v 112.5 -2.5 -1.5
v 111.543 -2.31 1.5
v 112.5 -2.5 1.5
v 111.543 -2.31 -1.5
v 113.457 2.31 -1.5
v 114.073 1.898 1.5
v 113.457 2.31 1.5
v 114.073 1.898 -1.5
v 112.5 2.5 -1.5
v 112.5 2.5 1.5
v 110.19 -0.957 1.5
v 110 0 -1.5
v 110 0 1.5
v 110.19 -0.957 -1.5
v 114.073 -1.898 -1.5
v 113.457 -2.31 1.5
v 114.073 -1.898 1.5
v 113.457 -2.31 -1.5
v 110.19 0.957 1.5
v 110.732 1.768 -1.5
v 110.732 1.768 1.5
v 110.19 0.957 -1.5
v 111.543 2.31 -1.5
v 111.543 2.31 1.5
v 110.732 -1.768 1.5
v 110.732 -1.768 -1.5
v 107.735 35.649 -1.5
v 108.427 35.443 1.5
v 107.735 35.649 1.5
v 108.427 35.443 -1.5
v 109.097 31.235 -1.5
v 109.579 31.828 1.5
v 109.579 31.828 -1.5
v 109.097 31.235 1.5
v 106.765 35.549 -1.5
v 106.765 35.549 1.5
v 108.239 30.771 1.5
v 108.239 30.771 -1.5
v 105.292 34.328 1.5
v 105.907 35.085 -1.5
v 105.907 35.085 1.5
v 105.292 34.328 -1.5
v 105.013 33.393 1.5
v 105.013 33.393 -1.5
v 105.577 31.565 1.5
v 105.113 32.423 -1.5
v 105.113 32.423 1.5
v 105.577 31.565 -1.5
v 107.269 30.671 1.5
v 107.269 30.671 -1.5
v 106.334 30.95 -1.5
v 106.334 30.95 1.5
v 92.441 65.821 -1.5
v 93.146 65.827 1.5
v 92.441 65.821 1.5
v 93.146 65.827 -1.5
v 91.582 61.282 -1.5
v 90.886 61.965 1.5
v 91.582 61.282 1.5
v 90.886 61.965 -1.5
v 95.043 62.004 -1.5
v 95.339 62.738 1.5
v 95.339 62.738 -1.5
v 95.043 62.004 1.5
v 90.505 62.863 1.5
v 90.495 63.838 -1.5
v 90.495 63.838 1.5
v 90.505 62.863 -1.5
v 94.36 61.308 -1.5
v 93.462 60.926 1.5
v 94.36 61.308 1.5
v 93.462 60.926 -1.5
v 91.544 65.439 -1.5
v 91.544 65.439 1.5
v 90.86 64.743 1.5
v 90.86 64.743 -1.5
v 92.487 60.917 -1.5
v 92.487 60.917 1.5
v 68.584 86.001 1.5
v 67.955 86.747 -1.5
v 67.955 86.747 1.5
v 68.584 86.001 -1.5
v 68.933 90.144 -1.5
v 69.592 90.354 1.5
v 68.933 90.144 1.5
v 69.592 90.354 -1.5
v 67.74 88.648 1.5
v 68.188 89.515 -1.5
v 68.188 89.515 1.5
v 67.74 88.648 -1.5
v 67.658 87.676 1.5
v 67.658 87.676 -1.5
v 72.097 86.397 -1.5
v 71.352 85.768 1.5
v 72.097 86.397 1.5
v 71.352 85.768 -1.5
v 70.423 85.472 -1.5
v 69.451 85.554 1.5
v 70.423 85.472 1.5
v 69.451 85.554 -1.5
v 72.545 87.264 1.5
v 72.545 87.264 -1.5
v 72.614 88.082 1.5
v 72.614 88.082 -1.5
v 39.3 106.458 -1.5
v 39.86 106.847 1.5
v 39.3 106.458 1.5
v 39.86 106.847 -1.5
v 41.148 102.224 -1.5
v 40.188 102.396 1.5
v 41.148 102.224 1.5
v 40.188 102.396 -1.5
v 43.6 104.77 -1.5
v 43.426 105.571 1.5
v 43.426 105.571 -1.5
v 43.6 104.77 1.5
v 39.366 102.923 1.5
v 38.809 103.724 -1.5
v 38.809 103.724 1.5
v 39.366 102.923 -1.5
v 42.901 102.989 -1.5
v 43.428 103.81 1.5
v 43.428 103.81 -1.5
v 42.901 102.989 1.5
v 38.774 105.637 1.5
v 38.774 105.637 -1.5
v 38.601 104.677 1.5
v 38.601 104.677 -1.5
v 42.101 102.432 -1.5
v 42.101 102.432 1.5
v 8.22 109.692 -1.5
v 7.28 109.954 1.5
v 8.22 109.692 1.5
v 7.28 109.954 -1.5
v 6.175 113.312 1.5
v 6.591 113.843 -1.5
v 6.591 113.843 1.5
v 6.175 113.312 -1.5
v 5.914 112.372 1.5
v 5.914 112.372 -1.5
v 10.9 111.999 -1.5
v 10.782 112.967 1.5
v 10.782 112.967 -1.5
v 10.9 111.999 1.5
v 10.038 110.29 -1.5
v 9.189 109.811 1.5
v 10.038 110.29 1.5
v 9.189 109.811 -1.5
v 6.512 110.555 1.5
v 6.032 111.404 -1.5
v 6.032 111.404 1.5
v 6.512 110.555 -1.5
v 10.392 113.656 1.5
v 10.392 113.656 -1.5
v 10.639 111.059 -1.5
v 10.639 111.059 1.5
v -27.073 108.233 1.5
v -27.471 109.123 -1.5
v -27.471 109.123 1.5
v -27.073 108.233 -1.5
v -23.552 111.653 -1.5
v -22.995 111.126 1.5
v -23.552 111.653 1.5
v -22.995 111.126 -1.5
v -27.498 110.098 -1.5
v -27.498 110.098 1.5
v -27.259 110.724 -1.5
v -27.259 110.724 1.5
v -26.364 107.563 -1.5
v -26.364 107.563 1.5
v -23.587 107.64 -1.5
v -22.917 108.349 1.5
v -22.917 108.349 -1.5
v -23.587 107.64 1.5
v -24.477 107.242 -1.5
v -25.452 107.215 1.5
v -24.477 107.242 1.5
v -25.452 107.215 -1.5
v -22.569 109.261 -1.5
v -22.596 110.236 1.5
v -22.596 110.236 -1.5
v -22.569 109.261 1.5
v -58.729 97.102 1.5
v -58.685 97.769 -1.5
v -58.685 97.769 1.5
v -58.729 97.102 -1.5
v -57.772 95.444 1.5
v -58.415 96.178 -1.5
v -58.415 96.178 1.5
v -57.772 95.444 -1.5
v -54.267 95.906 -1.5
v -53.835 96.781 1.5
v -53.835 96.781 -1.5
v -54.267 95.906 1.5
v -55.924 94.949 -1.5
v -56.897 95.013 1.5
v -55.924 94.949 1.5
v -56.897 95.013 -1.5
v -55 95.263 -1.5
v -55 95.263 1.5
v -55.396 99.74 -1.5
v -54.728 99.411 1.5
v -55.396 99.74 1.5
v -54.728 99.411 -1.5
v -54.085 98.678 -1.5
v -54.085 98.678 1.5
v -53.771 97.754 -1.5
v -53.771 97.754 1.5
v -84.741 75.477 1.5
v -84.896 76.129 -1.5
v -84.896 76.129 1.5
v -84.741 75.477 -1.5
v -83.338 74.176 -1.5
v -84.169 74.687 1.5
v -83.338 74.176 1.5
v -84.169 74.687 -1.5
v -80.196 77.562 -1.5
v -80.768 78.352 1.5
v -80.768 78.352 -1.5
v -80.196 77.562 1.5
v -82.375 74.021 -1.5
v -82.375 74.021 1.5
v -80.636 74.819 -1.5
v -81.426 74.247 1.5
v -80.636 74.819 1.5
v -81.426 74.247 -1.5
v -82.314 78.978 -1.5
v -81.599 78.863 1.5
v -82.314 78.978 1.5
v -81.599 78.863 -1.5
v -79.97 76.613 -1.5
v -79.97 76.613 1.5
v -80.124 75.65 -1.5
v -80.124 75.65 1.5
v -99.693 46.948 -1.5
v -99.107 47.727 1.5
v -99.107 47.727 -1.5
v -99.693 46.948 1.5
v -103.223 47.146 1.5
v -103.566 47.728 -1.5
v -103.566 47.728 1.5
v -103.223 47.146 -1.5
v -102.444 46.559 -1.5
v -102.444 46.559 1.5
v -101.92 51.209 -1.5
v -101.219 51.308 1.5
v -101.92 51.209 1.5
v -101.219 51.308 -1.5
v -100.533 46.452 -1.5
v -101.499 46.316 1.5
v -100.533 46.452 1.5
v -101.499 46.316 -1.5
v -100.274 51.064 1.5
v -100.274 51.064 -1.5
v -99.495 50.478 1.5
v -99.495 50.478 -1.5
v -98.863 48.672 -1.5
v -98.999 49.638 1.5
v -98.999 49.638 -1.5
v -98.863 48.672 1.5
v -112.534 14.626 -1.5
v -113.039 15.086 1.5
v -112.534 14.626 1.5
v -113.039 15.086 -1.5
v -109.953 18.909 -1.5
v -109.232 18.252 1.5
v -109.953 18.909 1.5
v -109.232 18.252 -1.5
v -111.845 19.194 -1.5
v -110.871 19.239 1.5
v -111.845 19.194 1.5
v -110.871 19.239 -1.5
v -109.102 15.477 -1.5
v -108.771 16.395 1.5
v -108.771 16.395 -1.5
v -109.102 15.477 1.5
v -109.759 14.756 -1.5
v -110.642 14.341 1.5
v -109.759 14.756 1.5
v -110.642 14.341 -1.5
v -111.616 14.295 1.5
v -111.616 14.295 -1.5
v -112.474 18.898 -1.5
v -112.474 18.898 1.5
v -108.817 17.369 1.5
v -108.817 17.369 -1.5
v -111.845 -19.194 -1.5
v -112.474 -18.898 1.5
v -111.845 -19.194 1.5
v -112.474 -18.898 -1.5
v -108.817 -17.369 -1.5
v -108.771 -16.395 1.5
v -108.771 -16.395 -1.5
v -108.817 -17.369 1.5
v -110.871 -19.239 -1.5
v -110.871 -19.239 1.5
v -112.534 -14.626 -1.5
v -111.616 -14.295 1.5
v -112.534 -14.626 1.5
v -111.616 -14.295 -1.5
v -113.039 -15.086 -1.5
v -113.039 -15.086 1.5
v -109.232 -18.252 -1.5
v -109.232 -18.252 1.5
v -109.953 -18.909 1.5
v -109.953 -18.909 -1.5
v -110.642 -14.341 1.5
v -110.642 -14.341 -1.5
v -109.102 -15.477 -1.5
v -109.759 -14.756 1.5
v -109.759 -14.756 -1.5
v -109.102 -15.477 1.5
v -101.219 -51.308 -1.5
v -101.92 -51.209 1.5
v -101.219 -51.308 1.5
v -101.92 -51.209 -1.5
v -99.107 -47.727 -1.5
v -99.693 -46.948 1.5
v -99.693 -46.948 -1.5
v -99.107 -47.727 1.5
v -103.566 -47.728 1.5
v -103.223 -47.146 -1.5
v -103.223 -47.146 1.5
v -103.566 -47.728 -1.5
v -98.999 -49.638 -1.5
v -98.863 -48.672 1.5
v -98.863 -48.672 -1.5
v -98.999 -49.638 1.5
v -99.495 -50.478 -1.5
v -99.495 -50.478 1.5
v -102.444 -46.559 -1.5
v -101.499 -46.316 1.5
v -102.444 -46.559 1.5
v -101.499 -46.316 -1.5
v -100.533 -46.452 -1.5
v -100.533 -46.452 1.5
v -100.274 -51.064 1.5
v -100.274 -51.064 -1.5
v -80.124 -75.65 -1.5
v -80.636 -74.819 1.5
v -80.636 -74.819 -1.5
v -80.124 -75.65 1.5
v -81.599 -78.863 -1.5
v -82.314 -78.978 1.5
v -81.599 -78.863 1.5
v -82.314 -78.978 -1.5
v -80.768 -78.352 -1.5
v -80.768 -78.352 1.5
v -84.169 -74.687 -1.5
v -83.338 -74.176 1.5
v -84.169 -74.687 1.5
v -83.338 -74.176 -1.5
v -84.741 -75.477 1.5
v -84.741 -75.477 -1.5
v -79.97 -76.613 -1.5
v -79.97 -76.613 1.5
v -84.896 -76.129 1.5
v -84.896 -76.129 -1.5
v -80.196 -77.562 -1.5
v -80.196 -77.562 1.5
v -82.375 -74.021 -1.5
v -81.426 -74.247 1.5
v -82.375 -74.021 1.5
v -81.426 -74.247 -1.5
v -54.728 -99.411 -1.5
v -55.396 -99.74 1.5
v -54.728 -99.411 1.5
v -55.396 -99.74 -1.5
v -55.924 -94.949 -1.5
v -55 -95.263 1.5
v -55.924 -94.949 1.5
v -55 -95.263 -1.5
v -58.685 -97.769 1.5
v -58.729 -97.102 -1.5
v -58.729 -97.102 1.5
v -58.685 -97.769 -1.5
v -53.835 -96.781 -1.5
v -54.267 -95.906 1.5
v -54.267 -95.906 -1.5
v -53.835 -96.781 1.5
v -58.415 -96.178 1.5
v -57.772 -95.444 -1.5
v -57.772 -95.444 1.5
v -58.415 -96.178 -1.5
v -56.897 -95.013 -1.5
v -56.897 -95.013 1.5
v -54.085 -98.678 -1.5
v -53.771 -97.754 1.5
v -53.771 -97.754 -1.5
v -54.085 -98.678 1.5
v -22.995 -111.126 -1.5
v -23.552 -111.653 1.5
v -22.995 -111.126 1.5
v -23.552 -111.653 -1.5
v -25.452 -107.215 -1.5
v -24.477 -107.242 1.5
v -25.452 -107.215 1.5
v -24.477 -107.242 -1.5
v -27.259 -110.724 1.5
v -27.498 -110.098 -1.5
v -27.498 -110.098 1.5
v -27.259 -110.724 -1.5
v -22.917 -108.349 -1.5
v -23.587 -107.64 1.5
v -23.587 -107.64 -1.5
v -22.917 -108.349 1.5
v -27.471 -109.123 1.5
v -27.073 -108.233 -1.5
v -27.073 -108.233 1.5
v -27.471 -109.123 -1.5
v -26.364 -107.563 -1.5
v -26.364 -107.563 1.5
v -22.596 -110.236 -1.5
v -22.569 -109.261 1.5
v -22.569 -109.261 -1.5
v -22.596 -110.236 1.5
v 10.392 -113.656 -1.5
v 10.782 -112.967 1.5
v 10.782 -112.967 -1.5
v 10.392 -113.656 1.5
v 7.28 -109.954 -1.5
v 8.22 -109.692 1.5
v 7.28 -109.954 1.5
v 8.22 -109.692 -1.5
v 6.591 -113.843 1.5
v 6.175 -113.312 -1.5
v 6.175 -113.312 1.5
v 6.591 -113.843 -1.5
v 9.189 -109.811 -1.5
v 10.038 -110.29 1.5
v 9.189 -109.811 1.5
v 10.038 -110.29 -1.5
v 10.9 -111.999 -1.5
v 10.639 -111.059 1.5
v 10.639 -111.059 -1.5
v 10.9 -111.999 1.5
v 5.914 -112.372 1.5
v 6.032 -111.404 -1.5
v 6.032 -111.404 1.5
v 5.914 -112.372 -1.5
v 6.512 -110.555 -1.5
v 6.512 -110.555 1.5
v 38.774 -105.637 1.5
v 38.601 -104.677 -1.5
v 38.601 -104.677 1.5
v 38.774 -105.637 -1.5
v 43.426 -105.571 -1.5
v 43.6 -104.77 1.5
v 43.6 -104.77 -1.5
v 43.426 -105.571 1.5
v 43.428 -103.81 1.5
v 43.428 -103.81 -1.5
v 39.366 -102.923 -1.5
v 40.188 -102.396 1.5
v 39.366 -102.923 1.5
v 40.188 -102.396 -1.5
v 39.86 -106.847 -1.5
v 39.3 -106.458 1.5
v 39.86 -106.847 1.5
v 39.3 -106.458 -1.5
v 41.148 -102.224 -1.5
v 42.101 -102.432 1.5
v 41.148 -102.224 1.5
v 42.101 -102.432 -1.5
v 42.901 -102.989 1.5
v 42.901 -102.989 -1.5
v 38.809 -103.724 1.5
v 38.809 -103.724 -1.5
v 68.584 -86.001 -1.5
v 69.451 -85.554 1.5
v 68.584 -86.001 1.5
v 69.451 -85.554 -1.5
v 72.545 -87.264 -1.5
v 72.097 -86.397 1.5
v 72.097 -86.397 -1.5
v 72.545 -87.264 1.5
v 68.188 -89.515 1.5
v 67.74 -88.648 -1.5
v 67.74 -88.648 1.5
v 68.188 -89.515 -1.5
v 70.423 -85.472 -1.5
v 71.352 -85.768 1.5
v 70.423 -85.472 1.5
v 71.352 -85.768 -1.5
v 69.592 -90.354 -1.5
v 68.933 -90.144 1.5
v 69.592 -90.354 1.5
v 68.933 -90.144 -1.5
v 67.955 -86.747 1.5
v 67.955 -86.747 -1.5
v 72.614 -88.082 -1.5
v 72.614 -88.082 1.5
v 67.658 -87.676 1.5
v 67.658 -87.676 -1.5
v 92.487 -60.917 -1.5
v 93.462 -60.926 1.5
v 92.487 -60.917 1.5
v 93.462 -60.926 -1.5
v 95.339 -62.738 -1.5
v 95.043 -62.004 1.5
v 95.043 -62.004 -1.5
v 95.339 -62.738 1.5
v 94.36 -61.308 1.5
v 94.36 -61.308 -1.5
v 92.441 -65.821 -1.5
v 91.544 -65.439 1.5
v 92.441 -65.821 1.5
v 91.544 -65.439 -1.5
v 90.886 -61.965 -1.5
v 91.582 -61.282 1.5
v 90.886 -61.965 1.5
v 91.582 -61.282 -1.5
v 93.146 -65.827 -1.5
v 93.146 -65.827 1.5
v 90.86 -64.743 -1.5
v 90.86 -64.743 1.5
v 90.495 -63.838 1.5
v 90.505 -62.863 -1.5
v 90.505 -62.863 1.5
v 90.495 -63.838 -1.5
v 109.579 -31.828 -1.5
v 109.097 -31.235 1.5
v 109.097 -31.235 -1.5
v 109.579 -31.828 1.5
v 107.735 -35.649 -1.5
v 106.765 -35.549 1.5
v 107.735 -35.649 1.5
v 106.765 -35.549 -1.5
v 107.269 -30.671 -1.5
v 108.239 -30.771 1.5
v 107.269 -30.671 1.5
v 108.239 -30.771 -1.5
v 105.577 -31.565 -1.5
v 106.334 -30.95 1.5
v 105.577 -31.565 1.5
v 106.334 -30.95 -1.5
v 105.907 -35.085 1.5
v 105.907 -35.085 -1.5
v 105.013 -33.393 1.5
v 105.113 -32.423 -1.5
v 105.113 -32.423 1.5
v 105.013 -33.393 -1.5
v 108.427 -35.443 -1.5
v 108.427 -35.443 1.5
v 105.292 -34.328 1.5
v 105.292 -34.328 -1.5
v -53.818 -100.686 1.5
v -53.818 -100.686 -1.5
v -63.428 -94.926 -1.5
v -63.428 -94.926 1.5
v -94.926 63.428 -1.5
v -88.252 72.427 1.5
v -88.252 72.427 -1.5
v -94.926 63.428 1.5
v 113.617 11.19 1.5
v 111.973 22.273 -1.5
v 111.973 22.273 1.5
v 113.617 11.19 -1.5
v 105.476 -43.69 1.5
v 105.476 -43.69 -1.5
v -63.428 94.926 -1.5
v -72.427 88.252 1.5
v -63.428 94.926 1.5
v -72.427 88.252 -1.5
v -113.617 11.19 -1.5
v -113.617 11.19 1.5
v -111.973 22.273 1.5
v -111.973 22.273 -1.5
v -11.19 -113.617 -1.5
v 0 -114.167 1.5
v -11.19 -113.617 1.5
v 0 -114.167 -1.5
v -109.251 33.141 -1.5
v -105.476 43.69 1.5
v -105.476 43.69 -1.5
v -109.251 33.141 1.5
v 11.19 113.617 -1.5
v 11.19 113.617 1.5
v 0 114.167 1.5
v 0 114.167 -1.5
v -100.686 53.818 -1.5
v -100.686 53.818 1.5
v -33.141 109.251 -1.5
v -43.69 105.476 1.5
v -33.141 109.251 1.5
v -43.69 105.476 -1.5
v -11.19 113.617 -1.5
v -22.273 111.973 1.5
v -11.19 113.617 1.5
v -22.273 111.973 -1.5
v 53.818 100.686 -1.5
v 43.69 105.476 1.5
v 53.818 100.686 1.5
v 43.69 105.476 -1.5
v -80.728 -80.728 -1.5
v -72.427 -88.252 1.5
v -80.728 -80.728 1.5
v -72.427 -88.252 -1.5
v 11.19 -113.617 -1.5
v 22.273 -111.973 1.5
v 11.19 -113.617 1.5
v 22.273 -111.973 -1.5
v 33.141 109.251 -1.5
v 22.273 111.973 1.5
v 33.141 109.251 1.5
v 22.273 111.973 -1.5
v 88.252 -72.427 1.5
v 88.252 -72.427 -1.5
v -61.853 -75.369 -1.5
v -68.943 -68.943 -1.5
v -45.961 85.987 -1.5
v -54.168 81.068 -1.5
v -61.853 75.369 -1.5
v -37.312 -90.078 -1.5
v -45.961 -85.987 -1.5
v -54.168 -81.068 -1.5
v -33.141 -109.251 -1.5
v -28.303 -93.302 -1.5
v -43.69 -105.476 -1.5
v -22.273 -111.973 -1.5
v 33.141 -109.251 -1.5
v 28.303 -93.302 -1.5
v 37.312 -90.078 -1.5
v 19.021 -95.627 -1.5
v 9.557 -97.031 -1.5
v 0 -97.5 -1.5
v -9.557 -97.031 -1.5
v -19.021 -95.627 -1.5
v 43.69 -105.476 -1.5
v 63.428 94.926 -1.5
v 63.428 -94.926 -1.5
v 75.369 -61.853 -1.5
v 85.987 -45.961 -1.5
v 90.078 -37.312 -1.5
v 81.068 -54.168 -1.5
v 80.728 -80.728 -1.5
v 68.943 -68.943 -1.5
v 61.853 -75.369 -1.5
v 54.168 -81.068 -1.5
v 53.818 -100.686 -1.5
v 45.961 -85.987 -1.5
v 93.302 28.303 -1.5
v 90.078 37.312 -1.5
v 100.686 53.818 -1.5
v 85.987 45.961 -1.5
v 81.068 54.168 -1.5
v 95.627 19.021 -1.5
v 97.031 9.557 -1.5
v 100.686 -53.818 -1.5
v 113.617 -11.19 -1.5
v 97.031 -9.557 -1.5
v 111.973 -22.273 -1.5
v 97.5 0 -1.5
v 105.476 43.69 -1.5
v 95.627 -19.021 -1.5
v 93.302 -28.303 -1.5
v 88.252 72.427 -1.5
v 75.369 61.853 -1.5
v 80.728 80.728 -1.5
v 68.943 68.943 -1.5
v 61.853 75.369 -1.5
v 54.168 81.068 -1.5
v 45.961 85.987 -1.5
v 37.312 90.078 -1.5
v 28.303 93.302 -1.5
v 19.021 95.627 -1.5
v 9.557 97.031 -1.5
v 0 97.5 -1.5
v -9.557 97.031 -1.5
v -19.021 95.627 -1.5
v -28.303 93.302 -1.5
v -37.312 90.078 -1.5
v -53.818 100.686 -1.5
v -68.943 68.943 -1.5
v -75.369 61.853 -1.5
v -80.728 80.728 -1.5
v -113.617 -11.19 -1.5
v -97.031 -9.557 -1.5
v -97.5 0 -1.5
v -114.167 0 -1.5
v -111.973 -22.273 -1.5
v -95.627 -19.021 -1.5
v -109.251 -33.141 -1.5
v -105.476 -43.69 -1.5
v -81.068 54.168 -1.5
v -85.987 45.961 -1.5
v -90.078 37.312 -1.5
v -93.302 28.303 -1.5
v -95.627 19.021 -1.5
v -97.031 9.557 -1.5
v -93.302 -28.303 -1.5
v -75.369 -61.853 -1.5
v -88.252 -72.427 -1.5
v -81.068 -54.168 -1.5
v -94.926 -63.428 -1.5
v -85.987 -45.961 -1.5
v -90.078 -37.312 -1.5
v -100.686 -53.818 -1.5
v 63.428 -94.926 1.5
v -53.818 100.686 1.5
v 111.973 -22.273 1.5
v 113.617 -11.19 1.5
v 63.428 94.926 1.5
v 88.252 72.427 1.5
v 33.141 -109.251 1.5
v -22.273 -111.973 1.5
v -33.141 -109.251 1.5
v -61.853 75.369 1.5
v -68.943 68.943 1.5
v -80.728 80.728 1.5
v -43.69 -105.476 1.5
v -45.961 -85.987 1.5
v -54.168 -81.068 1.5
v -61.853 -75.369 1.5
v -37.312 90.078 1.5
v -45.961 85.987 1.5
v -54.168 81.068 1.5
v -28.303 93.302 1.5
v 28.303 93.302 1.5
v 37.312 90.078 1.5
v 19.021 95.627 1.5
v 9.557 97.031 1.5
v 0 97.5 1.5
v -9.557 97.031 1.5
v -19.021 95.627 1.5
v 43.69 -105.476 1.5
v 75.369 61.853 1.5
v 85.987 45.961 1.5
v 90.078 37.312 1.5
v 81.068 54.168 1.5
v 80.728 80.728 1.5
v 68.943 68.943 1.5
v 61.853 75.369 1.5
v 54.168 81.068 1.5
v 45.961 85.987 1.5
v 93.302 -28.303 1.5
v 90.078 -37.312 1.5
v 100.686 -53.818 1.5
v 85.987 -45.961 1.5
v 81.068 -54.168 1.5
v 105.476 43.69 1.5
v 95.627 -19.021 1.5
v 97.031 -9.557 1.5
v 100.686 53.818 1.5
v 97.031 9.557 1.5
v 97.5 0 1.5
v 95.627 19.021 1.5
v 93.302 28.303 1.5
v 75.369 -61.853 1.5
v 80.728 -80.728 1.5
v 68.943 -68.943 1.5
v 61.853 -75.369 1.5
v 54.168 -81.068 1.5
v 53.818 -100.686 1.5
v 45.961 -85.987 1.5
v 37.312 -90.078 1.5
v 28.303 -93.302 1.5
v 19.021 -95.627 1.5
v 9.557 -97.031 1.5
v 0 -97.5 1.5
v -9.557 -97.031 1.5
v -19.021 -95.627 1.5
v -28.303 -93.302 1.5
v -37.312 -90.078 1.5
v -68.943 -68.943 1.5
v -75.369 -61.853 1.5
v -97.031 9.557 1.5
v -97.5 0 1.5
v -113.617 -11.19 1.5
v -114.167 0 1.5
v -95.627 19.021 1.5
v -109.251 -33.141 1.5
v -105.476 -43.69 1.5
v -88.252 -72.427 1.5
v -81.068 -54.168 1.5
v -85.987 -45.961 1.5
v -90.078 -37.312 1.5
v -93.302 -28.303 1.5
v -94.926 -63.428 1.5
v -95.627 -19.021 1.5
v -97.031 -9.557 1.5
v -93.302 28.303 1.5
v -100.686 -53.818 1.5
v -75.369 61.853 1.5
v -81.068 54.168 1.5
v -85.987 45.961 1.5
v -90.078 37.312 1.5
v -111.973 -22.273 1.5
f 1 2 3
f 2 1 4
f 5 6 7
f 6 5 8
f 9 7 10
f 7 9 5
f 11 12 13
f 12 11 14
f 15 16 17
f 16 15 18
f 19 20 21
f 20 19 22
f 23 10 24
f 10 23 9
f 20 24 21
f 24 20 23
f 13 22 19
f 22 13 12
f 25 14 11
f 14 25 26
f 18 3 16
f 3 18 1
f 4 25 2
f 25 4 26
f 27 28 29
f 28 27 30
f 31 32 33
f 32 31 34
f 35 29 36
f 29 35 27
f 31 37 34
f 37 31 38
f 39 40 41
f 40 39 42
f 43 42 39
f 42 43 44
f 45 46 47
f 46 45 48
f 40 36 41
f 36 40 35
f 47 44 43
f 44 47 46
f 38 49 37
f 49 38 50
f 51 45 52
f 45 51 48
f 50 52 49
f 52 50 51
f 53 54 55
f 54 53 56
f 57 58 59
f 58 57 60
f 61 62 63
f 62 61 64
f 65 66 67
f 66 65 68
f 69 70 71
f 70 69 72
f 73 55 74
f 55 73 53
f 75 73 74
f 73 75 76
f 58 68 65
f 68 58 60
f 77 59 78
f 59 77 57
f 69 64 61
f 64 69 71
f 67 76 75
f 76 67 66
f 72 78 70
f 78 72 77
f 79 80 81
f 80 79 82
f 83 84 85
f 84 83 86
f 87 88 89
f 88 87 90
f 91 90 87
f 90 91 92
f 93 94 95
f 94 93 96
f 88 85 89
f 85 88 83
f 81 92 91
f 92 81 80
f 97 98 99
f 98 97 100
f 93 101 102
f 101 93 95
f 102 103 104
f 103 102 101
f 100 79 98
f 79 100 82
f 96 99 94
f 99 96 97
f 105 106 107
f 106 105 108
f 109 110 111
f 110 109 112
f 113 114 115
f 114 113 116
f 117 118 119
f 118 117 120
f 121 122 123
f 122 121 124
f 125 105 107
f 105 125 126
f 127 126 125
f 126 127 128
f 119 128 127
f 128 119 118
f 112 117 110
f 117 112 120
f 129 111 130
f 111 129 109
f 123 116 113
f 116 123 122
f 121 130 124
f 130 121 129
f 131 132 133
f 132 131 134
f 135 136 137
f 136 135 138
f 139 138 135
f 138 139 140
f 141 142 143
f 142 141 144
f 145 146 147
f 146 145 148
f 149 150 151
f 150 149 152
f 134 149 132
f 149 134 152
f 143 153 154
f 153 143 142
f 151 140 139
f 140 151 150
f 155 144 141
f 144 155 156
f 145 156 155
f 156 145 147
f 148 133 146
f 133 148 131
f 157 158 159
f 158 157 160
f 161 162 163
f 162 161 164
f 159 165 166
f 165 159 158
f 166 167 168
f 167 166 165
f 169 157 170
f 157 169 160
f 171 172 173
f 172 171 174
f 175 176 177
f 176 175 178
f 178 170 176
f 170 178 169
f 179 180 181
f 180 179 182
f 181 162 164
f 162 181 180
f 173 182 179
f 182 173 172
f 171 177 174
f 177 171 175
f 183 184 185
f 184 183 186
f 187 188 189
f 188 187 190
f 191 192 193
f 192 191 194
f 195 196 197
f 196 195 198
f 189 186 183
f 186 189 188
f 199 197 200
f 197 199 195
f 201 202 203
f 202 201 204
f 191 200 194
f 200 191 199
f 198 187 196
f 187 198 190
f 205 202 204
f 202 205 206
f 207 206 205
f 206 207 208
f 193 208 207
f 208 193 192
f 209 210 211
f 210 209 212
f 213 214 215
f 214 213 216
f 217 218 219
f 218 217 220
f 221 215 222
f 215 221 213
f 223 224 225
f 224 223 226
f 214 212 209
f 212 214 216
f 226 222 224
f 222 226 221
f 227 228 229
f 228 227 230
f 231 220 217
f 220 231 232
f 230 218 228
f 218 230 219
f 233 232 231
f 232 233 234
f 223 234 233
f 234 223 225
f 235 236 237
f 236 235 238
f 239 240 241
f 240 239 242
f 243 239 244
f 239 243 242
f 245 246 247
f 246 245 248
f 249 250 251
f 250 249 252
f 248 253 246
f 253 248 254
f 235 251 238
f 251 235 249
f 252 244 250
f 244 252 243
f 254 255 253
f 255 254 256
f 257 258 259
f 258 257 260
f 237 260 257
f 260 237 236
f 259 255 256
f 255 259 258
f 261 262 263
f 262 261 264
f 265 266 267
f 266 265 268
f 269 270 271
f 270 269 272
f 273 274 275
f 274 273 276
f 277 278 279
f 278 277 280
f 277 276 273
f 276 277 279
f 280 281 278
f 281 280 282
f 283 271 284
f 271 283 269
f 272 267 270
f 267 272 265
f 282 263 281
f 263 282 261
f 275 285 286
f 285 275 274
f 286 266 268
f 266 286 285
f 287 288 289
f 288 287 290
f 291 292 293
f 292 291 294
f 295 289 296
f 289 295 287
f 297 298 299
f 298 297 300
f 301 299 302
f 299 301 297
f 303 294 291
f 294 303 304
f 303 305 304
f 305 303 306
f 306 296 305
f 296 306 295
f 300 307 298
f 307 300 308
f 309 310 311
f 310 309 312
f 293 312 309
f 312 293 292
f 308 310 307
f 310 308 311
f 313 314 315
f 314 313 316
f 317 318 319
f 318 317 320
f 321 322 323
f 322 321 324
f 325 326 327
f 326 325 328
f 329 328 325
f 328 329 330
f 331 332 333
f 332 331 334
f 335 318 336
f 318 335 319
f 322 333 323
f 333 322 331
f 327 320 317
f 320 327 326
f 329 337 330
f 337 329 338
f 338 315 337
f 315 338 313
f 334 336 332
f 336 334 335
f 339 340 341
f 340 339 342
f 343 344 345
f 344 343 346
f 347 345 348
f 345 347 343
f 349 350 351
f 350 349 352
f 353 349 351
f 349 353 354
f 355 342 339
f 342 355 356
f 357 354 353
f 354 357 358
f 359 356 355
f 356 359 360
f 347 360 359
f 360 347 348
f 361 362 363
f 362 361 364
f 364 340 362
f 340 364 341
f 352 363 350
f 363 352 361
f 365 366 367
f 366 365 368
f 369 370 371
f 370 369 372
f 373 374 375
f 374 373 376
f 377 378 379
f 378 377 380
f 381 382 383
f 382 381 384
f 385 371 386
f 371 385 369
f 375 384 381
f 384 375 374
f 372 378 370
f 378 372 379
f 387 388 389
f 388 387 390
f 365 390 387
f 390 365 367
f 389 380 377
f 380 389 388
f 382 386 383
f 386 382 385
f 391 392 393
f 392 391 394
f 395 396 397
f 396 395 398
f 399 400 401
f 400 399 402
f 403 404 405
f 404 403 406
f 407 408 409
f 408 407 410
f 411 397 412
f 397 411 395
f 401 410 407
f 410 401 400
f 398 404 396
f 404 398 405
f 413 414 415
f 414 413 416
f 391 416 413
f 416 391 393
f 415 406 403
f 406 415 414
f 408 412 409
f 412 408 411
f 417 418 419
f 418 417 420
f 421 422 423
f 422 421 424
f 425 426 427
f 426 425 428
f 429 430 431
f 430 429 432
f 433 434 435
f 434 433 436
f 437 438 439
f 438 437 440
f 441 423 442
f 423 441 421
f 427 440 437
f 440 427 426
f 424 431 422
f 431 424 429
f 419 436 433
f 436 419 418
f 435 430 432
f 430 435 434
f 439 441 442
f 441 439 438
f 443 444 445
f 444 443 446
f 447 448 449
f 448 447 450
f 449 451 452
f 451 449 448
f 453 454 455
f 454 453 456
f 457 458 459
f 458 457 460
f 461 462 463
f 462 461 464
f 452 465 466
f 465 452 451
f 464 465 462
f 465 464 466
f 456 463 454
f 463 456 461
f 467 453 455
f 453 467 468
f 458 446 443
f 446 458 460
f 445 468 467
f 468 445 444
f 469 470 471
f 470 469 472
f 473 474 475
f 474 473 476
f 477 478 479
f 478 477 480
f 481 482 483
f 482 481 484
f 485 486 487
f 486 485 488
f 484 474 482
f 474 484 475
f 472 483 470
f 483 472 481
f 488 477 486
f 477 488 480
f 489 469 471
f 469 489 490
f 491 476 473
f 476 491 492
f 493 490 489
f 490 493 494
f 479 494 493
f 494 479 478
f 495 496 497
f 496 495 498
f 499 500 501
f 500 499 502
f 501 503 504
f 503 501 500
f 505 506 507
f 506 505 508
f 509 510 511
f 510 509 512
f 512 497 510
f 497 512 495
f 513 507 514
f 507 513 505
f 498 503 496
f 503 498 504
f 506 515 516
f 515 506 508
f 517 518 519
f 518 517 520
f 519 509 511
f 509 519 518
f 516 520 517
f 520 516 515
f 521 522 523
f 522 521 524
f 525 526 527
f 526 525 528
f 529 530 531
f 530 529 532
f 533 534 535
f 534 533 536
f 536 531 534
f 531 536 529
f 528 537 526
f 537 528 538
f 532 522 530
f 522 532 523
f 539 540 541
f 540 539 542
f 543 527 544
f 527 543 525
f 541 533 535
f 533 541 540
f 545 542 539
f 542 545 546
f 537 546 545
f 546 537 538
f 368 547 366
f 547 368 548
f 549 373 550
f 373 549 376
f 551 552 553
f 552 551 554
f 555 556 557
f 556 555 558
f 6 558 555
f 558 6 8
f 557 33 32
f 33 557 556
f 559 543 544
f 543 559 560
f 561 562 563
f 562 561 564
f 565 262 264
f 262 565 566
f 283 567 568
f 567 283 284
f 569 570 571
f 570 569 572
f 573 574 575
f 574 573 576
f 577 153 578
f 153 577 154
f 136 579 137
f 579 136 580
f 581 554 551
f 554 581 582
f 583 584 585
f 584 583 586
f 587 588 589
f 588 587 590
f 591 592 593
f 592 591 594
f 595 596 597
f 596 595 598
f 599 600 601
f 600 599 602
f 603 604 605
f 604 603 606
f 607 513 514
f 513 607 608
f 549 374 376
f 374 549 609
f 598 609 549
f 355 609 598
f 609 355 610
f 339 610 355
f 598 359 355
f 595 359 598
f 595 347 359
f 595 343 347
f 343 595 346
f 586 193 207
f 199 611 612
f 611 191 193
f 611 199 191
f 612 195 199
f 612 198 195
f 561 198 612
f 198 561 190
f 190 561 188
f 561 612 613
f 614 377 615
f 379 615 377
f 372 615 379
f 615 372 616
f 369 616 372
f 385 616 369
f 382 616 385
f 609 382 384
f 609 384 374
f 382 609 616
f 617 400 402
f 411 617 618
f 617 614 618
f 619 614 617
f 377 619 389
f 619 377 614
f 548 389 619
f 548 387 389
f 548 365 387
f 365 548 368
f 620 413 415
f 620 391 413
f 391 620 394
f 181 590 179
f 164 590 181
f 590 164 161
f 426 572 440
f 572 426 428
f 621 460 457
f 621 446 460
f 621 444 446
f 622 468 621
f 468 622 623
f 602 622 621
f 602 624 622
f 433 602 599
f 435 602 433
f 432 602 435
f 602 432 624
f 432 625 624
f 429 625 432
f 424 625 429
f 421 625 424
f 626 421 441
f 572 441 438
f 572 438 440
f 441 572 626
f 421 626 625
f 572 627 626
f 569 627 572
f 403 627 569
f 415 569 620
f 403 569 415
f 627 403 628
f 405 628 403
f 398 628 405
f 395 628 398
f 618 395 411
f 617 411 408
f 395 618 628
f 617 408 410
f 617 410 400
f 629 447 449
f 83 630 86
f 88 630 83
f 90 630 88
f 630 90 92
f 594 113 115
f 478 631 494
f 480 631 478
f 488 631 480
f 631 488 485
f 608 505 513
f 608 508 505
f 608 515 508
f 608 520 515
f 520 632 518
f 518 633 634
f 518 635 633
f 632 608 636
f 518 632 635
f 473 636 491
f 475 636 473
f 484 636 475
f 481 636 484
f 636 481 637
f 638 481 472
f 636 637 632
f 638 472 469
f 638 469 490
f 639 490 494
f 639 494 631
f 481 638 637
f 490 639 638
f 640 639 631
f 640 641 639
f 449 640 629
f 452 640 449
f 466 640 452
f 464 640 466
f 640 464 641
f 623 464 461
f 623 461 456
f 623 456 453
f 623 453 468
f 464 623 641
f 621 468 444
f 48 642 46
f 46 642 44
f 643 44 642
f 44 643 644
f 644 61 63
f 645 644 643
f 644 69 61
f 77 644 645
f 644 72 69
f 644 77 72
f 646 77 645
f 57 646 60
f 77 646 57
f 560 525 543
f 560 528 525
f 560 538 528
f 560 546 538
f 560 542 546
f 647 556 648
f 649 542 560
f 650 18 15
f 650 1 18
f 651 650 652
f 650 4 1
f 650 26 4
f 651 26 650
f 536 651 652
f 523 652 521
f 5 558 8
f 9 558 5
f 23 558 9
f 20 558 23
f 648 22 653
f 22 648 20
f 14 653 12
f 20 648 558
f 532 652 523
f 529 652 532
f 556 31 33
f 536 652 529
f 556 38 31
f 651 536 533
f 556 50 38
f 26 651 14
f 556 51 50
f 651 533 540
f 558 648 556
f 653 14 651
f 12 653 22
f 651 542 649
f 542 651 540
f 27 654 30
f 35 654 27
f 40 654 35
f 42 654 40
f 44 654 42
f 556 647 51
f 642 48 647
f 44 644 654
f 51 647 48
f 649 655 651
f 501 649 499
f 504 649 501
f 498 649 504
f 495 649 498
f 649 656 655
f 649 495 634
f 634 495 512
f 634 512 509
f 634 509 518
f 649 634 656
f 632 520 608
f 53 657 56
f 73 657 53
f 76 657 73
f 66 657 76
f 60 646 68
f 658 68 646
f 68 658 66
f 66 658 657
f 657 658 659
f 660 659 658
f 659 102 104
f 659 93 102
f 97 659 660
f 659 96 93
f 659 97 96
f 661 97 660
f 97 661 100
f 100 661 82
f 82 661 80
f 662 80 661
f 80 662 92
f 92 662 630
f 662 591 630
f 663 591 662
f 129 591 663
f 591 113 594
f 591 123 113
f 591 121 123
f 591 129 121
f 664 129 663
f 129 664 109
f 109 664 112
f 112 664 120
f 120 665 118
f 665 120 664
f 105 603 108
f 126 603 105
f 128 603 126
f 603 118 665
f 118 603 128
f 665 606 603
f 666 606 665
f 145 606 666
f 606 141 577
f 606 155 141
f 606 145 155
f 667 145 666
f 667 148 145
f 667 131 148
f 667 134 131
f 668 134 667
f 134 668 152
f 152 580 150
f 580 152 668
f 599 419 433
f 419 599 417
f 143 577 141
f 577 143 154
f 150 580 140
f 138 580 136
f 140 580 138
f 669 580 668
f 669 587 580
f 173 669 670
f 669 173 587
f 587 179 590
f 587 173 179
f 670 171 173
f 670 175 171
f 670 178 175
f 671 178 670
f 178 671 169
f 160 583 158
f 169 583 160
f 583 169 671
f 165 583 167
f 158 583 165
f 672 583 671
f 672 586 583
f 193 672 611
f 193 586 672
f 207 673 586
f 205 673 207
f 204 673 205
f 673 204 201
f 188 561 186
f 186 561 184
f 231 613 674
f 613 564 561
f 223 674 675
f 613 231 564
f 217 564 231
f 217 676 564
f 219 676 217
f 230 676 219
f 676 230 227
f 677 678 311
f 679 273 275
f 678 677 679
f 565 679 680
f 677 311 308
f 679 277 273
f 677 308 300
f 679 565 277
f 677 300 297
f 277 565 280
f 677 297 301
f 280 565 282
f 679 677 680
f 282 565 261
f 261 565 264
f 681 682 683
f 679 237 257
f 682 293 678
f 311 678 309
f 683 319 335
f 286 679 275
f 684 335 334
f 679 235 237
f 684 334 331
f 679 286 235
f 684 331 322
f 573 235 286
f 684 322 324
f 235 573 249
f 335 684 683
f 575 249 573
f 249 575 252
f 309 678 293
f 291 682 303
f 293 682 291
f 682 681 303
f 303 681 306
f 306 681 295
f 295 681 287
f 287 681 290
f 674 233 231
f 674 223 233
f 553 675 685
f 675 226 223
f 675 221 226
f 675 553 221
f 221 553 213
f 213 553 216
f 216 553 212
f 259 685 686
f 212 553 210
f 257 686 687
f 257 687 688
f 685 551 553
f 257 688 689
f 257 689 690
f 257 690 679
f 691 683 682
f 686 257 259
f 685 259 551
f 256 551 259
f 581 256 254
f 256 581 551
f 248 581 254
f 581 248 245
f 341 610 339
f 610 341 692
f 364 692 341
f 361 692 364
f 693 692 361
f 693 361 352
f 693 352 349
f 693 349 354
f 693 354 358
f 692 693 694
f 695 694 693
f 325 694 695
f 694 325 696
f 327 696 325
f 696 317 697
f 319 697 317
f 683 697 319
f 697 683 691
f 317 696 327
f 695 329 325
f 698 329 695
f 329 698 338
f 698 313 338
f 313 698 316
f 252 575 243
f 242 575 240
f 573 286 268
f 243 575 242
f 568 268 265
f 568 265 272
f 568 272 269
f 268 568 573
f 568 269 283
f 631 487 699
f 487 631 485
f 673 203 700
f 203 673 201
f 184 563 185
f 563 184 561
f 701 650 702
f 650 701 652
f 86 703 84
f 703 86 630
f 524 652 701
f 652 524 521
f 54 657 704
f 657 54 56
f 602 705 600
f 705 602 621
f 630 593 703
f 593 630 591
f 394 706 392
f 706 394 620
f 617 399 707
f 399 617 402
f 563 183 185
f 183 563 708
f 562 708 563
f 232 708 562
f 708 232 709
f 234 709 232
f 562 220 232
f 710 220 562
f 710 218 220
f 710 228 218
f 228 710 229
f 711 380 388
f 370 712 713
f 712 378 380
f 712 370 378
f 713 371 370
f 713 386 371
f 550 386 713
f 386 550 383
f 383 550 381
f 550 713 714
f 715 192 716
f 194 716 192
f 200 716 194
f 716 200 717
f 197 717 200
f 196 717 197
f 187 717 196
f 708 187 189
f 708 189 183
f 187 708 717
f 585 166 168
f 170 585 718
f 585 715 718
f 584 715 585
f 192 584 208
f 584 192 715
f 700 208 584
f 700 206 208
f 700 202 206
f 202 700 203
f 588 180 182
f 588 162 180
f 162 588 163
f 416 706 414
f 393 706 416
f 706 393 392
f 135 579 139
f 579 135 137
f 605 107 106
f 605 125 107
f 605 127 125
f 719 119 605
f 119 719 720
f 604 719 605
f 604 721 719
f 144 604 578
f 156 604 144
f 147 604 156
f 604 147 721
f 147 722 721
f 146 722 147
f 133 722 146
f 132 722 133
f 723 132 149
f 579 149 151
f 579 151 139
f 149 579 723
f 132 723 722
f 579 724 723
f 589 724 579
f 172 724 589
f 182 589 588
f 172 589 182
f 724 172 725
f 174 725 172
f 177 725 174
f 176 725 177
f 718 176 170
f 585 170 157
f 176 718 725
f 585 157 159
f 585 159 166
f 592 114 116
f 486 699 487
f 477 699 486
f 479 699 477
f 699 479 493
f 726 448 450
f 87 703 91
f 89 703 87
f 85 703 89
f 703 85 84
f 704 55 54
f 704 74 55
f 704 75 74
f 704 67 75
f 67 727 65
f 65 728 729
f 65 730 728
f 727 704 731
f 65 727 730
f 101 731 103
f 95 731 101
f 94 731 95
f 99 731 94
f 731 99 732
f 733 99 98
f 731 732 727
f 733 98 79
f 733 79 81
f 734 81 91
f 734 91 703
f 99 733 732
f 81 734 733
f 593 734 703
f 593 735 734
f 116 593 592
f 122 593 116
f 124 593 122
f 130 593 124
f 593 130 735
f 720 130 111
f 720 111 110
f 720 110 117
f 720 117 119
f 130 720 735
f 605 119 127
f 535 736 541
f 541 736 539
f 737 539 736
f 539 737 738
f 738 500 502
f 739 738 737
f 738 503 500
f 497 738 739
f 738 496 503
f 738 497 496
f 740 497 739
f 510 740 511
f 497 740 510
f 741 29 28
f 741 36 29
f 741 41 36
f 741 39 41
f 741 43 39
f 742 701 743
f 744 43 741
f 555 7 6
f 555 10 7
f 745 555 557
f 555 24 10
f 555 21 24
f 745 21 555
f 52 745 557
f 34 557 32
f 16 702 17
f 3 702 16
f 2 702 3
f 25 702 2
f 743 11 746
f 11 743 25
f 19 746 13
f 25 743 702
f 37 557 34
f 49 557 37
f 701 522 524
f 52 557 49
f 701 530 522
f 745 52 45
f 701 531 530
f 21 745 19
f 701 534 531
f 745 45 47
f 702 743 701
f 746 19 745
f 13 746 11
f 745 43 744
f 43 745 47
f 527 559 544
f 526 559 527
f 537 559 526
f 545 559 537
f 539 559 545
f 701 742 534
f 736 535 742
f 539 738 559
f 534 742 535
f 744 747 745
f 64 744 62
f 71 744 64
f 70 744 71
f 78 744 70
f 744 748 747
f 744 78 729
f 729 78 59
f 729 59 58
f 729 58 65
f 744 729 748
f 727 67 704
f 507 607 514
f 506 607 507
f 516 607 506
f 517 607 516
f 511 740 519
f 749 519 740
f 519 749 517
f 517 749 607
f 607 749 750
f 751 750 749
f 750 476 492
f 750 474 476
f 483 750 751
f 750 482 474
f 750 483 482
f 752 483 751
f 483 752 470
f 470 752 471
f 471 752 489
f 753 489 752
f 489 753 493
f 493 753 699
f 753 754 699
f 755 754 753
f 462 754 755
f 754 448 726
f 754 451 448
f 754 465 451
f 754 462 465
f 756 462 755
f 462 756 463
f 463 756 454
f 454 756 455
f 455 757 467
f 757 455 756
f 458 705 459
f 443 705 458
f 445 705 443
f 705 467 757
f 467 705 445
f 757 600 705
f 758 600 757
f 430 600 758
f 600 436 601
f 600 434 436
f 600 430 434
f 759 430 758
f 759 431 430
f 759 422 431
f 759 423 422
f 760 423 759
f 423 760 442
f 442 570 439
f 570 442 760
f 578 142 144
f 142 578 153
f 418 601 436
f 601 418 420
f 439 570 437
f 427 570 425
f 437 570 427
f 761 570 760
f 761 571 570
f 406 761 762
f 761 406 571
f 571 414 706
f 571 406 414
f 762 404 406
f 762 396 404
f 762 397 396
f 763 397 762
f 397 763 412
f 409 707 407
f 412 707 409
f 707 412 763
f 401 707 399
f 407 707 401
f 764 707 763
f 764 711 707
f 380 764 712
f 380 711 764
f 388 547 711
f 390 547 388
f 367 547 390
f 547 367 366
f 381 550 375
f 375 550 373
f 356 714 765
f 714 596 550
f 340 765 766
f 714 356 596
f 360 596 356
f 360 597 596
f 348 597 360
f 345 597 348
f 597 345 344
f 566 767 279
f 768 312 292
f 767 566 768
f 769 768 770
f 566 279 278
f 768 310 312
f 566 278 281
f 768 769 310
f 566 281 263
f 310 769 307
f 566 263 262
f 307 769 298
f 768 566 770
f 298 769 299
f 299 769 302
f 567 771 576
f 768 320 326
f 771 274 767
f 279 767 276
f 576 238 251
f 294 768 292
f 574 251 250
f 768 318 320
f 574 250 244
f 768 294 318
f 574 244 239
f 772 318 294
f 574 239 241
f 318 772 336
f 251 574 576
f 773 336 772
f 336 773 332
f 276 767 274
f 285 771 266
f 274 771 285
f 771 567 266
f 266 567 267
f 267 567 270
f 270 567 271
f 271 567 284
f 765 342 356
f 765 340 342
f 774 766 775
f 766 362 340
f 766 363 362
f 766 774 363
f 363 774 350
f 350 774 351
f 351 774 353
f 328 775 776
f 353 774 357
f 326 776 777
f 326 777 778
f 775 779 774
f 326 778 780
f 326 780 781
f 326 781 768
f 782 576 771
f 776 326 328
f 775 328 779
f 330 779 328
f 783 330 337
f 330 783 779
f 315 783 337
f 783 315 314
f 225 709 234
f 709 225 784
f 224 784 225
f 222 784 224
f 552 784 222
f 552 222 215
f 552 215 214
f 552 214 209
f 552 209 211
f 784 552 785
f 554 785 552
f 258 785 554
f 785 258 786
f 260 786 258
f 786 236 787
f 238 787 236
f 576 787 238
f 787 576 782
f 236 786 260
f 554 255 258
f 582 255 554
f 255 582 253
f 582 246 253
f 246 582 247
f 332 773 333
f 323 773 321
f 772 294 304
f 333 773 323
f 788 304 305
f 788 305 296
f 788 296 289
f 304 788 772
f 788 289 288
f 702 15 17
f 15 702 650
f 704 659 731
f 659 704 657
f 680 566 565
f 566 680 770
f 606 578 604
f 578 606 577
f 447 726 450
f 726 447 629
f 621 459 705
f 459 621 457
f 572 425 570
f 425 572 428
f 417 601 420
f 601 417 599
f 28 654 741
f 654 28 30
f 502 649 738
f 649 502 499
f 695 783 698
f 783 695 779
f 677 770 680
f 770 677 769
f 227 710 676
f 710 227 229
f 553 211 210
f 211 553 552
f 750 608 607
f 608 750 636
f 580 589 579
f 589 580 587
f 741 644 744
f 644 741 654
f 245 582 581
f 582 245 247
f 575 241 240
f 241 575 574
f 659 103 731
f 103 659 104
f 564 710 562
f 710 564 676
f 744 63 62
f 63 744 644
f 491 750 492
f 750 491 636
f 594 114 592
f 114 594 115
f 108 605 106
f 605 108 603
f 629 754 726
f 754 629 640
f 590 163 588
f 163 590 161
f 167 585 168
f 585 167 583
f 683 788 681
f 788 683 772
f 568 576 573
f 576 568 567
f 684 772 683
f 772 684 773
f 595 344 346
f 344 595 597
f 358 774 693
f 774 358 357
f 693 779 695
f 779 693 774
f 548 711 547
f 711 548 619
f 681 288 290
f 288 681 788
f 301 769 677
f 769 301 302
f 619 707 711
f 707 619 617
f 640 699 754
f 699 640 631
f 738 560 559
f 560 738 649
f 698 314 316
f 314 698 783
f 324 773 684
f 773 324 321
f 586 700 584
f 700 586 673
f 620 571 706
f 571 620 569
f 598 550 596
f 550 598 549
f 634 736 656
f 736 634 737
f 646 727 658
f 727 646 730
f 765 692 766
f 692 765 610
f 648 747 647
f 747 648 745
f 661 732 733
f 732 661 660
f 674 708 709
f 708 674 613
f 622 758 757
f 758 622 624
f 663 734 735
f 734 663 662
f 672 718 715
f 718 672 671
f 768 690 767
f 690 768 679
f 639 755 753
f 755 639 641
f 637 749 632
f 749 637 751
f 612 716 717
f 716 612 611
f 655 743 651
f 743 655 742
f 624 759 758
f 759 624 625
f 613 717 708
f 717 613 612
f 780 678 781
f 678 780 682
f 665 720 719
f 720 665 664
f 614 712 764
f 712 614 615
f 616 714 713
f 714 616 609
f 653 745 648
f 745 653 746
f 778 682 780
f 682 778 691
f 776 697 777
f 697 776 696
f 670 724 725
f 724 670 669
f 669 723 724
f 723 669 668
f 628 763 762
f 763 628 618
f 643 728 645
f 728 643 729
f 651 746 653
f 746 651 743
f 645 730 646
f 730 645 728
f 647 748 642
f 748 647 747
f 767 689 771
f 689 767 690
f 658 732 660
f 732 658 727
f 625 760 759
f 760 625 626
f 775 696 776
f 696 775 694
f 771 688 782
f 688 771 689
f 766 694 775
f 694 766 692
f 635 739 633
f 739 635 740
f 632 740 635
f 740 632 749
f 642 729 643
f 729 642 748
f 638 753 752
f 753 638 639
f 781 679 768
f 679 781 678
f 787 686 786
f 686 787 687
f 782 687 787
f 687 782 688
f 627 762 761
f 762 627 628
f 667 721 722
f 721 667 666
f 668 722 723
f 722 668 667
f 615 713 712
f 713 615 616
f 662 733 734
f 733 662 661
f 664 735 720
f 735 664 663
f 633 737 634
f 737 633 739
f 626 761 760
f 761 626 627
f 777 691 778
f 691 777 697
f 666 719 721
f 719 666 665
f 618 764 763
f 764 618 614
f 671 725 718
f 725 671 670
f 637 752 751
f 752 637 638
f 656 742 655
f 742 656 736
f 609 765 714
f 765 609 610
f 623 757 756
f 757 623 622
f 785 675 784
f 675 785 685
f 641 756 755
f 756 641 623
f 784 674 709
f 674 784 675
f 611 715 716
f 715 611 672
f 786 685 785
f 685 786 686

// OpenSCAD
diameter = 225;
width = 15;
hole = 21;
hole_diameter = 5;

notch = true;

difference() {
	if (notch) 
		cylinder(3,diameter/2+hole_diameter/3, diameter/2+hole_diameter/3, true, $fn=64);
	else
		cylinder(3,diameter/2+width, diameter/2+width, true, $fn=64);
	cylinder(4,diameter/2-width, diameter/2-width, true, $fn=64);

	for( r = [0 : 360/hole : 360]) {
		rotate([0,0,r])
			translate([diameter/2,0,0])
				cylinder(4,hole_diameter/2,hole_diameter/2, true, $fn=16);
	}
}
